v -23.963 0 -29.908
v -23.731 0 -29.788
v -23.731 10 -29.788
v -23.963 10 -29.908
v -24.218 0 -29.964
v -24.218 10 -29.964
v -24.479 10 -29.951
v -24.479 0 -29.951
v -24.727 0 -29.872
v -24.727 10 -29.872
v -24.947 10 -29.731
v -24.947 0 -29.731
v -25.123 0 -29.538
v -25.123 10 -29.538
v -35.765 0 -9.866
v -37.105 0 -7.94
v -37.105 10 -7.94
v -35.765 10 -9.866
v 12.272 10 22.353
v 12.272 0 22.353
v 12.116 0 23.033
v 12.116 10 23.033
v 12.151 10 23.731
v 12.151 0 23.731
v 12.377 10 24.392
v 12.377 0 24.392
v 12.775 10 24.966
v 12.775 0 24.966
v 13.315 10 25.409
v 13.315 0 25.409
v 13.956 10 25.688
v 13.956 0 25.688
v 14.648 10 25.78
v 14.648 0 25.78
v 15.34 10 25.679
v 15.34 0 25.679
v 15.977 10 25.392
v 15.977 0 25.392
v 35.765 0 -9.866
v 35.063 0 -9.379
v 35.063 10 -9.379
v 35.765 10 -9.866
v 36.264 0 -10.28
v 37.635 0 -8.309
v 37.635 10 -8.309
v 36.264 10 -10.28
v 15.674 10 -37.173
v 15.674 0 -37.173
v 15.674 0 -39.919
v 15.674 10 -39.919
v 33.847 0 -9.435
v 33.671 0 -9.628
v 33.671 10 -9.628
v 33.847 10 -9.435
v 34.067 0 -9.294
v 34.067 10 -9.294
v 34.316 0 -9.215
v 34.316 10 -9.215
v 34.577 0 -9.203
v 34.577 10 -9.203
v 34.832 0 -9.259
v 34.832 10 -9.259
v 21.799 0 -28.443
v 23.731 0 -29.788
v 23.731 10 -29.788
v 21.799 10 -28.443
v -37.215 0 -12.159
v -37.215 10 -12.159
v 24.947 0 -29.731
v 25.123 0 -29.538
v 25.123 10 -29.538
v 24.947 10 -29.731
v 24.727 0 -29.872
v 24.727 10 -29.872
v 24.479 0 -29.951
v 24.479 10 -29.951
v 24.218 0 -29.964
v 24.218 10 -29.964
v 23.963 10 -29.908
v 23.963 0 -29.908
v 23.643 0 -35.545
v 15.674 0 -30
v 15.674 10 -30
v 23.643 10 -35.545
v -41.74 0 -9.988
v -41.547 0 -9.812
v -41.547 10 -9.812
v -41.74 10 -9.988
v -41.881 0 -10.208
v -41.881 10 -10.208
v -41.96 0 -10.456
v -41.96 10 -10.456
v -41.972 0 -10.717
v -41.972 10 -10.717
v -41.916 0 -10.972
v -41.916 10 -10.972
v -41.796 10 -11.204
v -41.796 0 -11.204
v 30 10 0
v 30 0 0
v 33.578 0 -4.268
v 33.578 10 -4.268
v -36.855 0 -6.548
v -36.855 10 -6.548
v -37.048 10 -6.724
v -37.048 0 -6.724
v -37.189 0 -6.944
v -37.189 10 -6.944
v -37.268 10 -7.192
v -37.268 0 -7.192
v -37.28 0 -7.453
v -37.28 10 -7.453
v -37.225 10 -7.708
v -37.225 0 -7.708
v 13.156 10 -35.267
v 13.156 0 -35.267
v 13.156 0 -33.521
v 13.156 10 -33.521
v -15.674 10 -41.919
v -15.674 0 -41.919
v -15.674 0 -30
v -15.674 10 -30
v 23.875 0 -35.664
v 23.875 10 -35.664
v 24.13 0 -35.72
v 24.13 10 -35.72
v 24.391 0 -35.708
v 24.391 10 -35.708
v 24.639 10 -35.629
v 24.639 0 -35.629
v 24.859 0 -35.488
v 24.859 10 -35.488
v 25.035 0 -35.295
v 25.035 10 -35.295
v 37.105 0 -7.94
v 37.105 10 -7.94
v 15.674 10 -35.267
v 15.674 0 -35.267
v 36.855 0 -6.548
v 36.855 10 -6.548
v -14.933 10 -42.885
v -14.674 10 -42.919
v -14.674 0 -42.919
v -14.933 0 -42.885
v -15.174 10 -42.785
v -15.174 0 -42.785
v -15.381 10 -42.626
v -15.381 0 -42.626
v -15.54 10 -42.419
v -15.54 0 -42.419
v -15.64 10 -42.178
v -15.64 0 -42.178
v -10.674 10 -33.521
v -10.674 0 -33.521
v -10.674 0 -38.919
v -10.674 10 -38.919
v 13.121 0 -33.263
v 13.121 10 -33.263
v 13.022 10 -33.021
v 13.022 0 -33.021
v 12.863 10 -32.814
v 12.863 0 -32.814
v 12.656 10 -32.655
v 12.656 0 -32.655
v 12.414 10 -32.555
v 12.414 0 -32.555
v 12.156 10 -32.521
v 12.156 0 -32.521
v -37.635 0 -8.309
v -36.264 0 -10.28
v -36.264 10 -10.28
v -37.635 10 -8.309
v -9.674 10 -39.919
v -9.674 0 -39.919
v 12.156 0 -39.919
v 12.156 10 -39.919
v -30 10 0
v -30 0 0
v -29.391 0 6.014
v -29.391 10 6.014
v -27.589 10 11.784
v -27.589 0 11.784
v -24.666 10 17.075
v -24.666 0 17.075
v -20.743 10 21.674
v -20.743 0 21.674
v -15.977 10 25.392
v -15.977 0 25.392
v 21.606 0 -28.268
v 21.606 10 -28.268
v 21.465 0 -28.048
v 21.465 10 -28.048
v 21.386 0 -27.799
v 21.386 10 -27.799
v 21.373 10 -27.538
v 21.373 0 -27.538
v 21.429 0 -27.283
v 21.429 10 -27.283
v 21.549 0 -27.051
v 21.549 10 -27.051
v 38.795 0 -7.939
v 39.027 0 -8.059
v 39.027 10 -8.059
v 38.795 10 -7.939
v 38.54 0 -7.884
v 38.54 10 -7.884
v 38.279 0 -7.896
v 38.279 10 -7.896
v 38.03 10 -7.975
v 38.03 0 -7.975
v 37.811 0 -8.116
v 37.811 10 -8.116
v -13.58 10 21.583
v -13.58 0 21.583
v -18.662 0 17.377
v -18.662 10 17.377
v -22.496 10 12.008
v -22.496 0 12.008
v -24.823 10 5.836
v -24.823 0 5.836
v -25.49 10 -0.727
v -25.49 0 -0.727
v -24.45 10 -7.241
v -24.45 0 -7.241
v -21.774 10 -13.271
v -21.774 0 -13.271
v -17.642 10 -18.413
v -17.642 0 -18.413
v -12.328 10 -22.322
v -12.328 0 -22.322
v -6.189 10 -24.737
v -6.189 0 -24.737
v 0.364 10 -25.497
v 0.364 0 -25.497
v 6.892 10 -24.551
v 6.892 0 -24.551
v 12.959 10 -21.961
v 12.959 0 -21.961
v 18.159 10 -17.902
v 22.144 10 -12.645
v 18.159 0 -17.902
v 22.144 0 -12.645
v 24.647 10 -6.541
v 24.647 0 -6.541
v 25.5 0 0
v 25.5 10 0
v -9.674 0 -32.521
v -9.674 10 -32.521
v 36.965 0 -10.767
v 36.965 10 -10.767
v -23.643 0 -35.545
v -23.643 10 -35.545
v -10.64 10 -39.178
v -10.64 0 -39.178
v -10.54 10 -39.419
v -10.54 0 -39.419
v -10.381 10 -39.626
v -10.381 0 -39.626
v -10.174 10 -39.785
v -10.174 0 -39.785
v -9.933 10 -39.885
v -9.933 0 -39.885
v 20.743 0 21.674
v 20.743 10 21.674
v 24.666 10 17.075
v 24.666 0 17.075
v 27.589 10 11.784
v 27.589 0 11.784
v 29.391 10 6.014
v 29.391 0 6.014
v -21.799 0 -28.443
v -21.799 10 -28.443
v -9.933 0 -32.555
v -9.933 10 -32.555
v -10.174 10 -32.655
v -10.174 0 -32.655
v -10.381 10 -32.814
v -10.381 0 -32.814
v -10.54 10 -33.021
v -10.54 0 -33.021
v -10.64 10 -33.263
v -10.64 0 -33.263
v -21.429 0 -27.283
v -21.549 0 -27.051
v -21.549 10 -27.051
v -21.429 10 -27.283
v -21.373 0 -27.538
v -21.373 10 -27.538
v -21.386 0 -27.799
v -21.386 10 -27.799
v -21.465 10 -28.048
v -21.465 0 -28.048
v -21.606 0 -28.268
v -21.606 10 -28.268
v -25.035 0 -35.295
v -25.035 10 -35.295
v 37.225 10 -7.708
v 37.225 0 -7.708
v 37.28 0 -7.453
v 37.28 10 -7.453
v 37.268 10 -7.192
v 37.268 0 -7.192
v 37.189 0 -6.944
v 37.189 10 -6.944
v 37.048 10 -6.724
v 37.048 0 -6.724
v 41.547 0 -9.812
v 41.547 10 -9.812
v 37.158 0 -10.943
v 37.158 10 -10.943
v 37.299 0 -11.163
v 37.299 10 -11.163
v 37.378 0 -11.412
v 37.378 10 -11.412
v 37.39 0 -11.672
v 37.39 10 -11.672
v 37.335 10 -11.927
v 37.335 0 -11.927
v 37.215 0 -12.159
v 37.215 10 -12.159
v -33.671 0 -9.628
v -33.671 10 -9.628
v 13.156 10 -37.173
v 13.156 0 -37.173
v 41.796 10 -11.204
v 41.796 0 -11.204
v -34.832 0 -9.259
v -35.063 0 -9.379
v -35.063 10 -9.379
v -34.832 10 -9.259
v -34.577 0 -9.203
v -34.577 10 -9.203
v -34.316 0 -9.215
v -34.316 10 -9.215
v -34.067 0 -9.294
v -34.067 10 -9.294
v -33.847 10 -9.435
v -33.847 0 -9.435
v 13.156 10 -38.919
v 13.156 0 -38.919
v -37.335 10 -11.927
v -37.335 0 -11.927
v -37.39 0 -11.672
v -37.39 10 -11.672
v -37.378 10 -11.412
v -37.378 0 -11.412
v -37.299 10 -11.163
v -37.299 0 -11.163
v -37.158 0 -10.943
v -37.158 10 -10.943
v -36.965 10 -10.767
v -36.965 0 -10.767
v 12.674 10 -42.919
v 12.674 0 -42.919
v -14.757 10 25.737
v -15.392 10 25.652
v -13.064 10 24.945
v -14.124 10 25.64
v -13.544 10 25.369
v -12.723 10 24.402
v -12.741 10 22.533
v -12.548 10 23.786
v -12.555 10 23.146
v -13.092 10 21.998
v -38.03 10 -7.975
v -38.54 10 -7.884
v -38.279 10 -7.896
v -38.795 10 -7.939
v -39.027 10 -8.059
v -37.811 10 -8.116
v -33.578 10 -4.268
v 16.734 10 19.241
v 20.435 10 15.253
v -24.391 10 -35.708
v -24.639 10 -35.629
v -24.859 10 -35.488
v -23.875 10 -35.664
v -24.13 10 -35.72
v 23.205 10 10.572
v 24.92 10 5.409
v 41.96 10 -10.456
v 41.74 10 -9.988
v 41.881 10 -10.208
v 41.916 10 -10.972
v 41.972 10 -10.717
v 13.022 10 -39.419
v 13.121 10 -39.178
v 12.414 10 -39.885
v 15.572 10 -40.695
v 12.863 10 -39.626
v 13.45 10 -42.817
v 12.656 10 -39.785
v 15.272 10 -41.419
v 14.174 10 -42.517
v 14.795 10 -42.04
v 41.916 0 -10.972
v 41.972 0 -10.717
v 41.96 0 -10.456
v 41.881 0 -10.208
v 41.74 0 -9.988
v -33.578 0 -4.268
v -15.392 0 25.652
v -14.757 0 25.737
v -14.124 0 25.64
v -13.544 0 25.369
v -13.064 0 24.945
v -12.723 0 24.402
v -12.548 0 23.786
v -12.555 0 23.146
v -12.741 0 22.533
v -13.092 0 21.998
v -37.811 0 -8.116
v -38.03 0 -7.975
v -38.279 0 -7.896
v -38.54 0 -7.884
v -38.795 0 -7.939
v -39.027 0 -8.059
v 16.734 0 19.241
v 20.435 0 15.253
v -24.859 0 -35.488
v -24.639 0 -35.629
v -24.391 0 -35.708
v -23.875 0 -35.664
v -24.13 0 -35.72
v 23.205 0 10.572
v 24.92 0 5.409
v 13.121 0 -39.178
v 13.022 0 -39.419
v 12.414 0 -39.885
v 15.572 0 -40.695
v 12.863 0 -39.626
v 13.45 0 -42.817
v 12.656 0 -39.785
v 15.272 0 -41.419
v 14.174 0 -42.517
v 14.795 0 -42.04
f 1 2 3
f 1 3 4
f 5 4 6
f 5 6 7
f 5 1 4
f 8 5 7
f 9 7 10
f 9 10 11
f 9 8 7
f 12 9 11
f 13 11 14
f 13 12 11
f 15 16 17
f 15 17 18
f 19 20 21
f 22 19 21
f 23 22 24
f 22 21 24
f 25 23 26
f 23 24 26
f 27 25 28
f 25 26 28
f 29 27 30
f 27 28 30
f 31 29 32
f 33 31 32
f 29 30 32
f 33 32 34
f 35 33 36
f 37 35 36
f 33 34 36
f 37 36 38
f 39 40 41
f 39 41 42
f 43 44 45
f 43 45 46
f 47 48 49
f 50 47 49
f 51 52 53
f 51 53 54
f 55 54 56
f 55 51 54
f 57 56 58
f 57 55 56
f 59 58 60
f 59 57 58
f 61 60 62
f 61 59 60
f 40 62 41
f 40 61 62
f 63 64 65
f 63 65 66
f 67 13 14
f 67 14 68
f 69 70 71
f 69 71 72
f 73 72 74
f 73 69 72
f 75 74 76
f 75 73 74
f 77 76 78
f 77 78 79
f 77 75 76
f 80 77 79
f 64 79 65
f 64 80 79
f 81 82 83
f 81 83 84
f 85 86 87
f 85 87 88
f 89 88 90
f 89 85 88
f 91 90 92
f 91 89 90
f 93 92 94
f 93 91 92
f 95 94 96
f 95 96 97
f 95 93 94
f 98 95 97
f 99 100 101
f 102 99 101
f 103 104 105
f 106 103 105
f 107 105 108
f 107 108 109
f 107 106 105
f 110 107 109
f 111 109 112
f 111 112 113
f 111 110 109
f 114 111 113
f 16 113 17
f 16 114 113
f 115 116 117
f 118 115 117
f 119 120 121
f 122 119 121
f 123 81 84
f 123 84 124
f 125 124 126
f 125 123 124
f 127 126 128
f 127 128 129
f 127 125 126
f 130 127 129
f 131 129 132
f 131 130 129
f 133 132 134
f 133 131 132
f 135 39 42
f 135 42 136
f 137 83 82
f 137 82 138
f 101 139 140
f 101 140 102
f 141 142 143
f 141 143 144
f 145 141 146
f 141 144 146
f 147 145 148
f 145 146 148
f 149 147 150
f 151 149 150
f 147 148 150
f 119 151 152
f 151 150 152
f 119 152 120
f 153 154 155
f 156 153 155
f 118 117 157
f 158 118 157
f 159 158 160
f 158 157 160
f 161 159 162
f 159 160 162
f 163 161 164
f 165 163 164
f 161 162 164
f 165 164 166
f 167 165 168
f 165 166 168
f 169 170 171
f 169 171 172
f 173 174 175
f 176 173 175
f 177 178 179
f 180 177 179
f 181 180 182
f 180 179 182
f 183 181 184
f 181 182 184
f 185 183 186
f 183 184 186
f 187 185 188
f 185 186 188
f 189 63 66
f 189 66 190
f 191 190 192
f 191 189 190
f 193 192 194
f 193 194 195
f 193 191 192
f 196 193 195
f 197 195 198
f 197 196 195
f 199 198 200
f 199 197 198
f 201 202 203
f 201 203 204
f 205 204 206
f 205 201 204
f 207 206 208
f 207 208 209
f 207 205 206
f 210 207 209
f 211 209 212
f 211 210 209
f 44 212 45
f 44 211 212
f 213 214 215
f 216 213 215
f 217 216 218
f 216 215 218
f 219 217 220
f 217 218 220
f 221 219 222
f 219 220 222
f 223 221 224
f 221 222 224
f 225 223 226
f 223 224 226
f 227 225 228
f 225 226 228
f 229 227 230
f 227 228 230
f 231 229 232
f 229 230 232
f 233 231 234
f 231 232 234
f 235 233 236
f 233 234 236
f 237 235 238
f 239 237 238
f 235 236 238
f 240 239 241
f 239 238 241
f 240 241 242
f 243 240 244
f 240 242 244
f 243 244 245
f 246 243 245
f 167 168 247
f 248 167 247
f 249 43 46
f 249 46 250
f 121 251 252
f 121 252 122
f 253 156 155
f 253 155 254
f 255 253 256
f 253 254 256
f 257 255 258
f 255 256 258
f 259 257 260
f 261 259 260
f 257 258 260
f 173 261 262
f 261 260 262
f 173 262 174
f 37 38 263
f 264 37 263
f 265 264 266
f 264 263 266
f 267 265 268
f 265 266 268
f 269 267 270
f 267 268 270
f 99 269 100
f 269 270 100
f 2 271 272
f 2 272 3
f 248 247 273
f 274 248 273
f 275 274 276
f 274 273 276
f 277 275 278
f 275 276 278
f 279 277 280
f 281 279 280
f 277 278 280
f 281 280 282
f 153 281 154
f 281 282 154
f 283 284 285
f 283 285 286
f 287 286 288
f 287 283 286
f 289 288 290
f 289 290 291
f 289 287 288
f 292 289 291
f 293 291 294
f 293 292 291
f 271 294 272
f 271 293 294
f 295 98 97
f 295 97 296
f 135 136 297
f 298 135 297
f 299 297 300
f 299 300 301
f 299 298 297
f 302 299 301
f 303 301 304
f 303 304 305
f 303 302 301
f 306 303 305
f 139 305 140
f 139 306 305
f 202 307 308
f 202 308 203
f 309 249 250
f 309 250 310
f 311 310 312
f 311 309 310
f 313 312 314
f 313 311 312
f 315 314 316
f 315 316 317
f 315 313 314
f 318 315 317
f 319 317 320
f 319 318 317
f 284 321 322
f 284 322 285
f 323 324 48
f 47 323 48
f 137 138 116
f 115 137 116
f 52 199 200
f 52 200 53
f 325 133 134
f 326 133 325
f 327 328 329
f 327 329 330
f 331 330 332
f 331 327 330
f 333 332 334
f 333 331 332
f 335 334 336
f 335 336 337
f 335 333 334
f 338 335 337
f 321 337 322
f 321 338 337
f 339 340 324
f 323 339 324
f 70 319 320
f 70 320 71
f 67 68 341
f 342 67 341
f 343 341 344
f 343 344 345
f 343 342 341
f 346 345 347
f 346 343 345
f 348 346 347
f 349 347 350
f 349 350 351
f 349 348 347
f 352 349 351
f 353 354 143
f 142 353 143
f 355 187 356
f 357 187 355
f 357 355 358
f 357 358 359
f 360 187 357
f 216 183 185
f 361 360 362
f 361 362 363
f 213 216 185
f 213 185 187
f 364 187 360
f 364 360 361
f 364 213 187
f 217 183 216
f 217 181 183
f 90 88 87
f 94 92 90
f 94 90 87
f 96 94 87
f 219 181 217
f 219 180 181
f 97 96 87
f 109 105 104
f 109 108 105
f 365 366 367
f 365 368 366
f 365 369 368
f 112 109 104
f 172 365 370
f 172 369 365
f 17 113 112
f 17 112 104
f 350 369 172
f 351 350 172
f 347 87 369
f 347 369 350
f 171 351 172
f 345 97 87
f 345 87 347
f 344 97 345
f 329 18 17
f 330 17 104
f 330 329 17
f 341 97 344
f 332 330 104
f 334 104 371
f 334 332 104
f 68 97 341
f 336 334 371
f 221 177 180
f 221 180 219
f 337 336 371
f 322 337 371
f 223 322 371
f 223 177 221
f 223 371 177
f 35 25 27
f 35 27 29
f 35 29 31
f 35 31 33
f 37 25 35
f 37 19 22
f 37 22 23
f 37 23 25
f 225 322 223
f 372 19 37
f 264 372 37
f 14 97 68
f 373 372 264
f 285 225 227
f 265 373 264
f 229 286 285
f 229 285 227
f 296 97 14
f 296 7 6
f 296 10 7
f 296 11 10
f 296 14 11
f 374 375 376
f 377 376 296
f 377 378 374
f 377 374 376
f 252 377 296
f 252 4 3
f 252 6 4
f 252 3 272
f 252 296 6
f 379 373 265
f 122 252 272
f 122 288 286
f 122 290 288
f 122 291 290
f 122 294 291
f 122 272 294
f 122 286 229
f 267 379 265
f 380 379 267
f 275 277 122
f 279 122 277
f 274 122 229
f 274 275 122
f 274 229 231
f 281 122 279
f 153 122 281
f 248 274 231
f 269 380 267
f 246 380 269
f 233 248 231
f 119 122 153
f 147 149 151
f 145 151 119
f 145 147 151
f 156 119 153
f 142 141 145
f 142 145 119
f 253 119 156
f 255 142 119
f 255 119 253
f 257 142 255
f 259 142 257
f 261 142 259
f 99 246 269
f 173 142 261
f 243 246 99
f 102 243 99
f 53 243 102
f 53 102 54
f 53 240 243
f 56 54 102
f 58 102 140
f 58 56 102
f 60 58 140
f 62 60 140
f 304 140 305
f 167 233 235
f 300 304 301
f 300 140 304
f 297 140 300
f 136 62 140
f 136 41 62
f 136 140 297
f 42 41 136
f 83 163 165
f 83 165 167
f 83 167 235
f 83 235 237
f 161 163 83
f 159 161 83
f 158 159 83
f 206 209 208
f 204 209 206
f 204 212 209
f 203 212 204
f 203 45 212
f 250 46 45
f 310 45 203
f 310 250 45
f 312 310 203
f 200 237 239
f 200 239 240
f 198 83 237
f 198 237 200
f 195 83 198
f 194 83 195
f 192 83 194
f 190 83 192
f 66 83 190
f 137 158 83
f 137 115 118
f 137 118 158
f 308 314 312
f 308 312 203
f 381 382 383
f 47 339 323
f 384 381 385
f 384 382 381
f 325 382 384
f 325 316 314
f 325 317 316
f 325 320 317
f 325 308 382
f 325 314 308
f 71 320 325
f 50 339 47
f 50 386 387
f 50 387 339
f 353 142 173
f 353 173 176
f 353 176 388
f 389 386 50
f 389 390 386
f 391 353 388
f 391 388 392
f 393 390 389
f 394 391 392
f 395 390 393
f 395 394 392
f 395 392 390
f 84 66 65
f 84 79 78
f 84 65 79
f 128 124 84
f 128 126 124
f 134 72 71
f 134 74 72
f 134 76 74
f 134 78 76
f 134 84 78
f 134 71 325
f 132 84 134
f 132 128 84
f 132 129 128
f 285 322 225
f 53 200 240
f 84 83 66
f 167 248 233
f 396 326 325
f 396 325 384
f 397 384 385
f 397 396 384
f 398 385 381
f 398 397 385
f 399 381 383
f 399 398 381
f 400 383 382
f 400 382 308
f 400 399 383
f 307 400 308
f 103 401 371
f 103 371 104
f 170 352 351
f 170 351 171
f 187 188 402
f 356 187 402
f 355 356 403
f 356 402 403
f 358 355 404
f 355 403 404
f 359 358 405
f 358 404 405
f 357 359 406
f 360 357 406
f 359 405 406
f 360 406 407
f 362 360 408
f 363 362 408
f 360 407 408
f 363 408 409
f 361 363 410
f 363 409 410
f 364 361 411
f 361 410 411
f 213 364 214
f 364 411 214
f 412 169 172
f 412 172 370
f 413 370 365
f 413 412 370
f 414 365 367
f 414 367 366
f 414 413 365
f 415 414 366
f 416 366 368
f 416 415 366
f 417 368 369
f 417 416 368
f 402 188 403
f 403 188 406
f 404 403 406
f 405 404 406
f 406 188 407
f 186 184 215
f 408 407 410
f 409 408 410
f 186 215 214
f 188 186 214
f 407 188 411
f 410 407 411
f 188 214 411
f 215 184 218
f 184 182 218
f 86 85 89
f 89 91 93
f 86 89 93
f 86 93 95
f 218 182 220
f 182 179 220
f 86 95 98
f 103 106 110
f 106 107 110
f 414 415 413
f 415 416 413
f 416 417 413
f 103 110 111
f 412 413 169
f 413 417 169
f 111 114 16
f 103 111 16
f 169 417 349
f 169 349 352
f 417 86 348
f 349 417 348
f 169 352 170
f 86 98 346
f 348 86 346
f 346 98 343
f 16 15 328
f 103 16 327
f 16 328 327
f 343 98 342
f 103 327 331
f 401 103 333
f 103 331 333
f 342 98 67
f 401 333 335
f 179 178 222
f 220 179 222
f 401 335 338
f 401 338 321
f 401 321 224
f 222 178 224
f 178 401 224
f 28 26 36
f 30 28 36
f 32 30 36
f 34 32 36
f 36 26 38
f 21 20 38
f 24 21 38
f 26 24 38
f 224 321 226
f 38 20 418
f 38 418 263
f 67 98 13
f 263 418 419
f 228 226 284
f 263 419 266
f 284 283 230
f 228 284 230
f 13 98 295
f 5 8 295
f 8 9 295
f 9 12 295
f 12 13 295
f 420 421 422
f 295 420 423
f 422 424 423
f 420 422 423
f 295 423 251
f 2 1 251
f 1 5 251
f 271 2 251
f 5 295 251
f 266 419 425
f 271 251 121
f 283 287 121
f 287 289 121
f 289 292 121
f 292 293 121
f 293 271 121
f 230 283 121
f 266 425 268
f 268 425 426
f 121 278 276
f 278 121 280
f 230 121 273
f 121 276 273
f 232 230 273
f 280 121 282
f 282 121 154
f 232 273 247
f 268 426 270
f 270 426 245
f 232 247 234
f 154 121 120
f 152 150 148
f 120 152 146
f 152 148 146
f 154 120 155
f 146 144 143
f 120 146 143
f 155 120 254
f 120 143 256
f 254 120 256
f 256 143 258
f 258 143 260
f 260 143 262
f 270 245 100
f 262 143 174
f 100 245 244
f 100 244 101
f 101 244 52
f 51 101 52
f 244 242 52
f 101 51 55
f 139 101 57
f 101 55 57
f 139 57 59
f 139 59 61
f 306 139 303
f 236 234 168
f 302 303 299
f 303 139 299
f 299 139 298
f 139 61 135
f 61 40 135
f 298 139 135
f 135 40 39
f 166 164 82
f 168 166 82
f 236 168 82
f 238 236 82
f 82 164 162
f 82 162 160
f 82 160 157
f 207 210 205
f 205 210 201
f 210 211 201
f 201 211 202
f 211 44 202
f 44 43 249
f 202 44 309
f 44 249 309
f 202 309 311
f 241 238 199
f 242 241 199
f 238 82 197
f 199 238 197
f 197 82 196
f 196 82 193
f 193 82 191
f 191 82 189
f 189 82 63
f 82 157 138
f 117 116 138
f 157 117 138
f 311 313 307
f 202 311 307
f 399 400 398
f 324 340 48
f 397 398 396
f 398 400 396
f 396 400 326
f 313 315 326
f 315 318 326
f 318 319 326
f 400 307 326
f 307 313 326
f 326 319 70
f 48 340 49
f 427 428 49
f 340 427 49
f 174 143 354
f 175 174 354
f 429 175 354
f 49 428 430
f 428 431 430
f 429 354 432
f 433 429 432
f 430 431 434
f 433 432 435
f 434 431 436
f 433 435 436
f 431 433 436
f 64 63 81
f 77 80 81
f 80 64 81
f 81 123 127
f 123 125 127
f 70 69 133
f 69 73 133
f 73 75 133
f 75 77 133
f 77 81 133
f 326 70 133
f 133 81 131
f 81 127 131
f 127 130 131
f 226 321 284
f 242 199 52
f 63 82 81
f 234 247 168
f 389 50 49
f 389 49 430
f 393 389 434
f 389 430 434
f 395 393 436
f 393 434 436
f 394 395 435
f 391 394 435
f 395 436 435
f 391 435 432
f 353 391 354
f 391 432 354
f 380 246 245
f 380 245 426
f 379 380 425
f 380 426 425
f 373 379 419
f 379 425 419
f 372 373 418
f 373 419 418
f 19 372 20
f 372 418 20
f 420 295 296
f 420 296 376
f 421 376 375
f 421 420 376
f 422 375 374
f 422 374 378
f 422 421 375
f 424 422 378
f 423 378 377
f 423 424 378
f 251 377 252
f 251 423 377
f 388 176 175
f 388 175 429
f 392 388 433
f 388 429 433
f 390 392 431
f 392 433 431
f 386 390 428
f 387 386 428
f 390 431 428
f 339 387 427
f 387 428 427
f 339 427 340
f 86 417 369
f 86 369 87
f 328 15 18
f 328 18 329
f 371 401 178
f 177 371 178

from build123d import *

# Parameters (mm, degrees)
BOSS_EXTRUDE1_DEPTH = 10


with BuildPart() as part:
    # Sketch1 → Boss-Extrude1 (new body)
    with BuildSketch(Plane(origin=(0, 0, 0), x_dir=(1, 0, 0), z_dir=(0, 1, 0))):
        with BuildLine():
            ThreePointArc((0, 30), (-13.892167355, 26.589616135), (-24.625826483, 17.133845746))
            ThreePointArc((-24.625826483, 17.133845746), (-28.62494362, 8.978452136), (-30, 0))
            ThreePointArc((-30, 0), (-26.261196487, -14.503432665), (-15.976696063, -25.391832996))
            ThreePointArc((-15.976696063, -25.391832996), (-12.874056383, -24.685697726), (-13.580191653, -21.583058047))
            ThreePointArc((-13.580191653, -21.583058047), (-12.327917765, 22.322017014), (25.5, 0))
            ThreePointArc((25.5, 0), (21.945347053, -12.986598583), (12.272412334, -22.352581406))
            ThreePointArc((12.272412334, -22.352581406), (13.029650018, -25.206692228), (15.976696063, -25.391832996))
            ThreePointArc((15.976696063, -25.391832996), (26.261196487, -14.503432665), (30, 0))
            ThreePointArc((30, 0), (28.624943418, 8.978452779), (24.625825713, 17.133846852))
            ThreePointArc((24.625825713, 17.133846852), (13.892166758, 26.589616447), (0, 30))
        make_face()
        with BuildLine():
            Line((-24.625826483, 17.133845746), (-33.577676267, 4.267691868))
            Line((-33.577676267, 4.267691868), (-30, 0))
            ThreePointArc((-30, 0), (-28.62494362, 8.978452136), (-24.625826483, 17.133845746))
        make_face()
        with BuildLine():
            Line((-36.964920826, 10.767390882), (-36.263797685, 10.279572292))
            Line((-36.263797685, 10.279572292), (-37.634960984, 8.308851333))
            ThreePointArc((-37.634960984, 8.308851333), (-38.27923419, 7.895694616), (-39.02695006, 8.059118652))
            Line((-39.02695006, 8.059118652), (-41.546608741, 9.812214895))
            ThreePointArc((-41.546608741, 9.812214895), (-41.959765459, 10.456488101), (-41.796341422, 11.204203971))
            Line((-41.796341422, 11.204203971), (-25.034897988, 35.294790347))
            ThreePointArc((-25.034897988, 35.294790347), (-24.390624781, 35.707947064), (-23.642908912, 35.544523027))
            Line((-23.642908912, 35.544523027), (-15.673976437, 30))
            Line((-15.673976437, 30), (-33.577676267, 4.267691868))
            Line((-33.577676267, 4.267691868), (-36.855117659, 6.548028579))
            ThreePointArc((-36.855117659, 6.548028579), (-37.268274376, 7.192301785), (-37.104850339, 7.940017655))
            Line((-37.104850339, 7.940017655), (-35.764584616, 9.866330702))
            Line((-35.764584616, 9.866330702), (-35.063461475, 9.378512113))
            ThreePointArc((-35.063461475, 9.378512113), (-34.315745606, 9.215088076), (-33.671472399, 9.628244793))
            Line((-33.671472399, 9.628244793), (-21.548947673, 27.051489405))
            ThreePointArc((-21.548947673, 27.051489405), (-21.385523636, 27.799205275), (-21.798680354, 28.443478482))
            Line((-21.798680354, 28.443478482), (-23.731037279, 29.787949338))
            ThreePointArc((-23.731037279, 29.787949338), (-24.478753149, 29.951373375), (-25.123026356, 29.538216658))
            Line((-25.123026356, 29.538216658), (-37.214653506, 12.159379958))
            ThreePointArc((-37.214653506, 12.159379958), (-37.378077543, 11.411664088), (-36.964920826, 10.767390882))
        make_face()
        with BuildLine():
            Line((-10.673976437, 33.521405271), (-10.673976437, 38.918895687))
            ThreePointArc((-10.673976437, 38.918895687), (-10.381083218, 39.626002468), (-9.673976437, 39.918895687))
            Line((-9.673976437, 39.918895687), (12.155554915, 39.918895687))
            ThreePointArc((12.155554915, 39.918895687), (12.862661696, 39.626002468), (13.155554915, 38.918895687))
            Line((13.155554915, 38.918895687), (13.155554915, 37.173234143))
            Line((13.155554915, 37.173234143), (15.673976437, 37.173234143))
            Line((15.673976437, 37.173234143), (15.673976437, 39.918895687))
            ThreePointArc((15.673976437, 39.918895687), (14.795296781, 42.040216031), (12.673976437, 42.918895687))
            Line((12.673976437, 42.918895687), (-14.673976437, 42.918895687))
            ThreePointArc((-14.673976437, 42.918895687), (-15.381083218, 42.626002468), (-15.673976437, 41.918895687))
            Line((-15.673976437, 41.918895687), (-15.673976437, 30))
            Line((-15.673976437, 30), (0, 30))
            Line((0, 30), (15.673976437, 30))
            Line((15.673976437, 30), (15.673976437, 35.267066815))
            Line((15.673976437, 35.267066815), (13.155554915, 35.267066815))
            Line((13.155554915, 35.267066815), (13.155554915, 33.521405271))
            ThreePointArc((13.155554915, 33.521405271), (12.862661696, 32.81429849), (12.155554915, 32.521405271))
            Line((12.155554915, 32.521405271), (-9.673976437, 32.521405271))
            ThreePointArc((-9.673976437, 32.521405271), (-10.381083218, 32.81429849), (-10.673976437, 33.521405271))
        make_face()
        with BuildLine():
            ThreePointArc((37.104850339, 7.940017655), (37.268274376, 7.192301785), (36.855117659, 6.548028579))
            Line((36.855117659, 6.548028579), (33.577676267, 4.267691868))
            Line((33.577676267, 4.267691868), (15.673976437, 30))
            Line((15.673976437, 30), (23.642908912, 35.544523027))
            ThreePointArc((23.642908912, 35.544523027), (24.390624781, 35.707947064), (25.034897988, 35.294790347))
            Line((25.034897988, 35.294790347), (41.796341422, 11.204203971))
            ThreePointArc((41.796341422, 11.204203971), (41.959765459, 10.456488101), (41.546608741, 9.812214895))
            Line((41.546608741, 9.812214895), (39.02695006, 8.059118652))
            ThreePointArc((39.02695006, 8.059118652), (38.27923419, 7.895694616), (37.634960984, 8.308851333))
            Line((37.634960984, 8.308851333), (36.263797685, 10.279572292))
            Line((36.263797685, 10.279572292), (36.964920826, 10.767390882))
            ThreePointArc((36.964920826, 10.767390882), (37.378077543, 11.411664088), (37.214653506, 12.159379958))
            Line((37.214653506, 12.159379958), (25.123026356, 29.538216658))
            ThreePointArc((25.123026356, 29.538216658), (24.478753149, 29.951373375), (23.731037279, 29.787949338))
            Line((23.731037279, 29.787949338), (21.798680354, 28.443478482))
            ThreePointArc((21.798680354, 28.443478482), (21.385523636, 27.799205275), (21.548947673, 27.051489405))
            Line((21.548947673, 27.051489405), (33.671472399, 9.628244793))
            ThreePointArc((33.671472399, 9.628244793), (34.315745606, 9.215088076), (35.063461475, 9.378512113))
            Line((35.063461475, 9.378512113), (35.764584616, 9.866330702))
            Line((35.764584616, 9.866330702), (37.104850339, 7.940017655))
        make_face()
        with BuildLine():
            Line((-15.673976437, 30), (-24.625826483, 17.133845746))
            ThreePointArc((-24.625826483, 17.133845746), (-13.892167355, 26.589616135), (0, 30))
            Line((0, 30), (-15.673976437, 30))
        make_face()
        with BuildLine():
            Line((15.673976437, 30), (0, 30))
            ThreePointArc((0, 30), (13.892166758, 26.589616447), (24.625825713, 17.133846852))
            Line((24.625825713, 17.133846852), (15.673976437, 30))
        make_face()
        with BuildLine():
            Line((33.577676267, 4.267691868), (24.625825713, 17.133846852))
            ThreePointArc((24.625825713, 17.133846852), (28.624943418, 8.978452779), (30, 0))
            Line((30, 0), (33.577676267, 4.267691868))
        make_face()
    extrude(amount=BOSS_EXTRUDE1_DEPTH)


solid = part.part
